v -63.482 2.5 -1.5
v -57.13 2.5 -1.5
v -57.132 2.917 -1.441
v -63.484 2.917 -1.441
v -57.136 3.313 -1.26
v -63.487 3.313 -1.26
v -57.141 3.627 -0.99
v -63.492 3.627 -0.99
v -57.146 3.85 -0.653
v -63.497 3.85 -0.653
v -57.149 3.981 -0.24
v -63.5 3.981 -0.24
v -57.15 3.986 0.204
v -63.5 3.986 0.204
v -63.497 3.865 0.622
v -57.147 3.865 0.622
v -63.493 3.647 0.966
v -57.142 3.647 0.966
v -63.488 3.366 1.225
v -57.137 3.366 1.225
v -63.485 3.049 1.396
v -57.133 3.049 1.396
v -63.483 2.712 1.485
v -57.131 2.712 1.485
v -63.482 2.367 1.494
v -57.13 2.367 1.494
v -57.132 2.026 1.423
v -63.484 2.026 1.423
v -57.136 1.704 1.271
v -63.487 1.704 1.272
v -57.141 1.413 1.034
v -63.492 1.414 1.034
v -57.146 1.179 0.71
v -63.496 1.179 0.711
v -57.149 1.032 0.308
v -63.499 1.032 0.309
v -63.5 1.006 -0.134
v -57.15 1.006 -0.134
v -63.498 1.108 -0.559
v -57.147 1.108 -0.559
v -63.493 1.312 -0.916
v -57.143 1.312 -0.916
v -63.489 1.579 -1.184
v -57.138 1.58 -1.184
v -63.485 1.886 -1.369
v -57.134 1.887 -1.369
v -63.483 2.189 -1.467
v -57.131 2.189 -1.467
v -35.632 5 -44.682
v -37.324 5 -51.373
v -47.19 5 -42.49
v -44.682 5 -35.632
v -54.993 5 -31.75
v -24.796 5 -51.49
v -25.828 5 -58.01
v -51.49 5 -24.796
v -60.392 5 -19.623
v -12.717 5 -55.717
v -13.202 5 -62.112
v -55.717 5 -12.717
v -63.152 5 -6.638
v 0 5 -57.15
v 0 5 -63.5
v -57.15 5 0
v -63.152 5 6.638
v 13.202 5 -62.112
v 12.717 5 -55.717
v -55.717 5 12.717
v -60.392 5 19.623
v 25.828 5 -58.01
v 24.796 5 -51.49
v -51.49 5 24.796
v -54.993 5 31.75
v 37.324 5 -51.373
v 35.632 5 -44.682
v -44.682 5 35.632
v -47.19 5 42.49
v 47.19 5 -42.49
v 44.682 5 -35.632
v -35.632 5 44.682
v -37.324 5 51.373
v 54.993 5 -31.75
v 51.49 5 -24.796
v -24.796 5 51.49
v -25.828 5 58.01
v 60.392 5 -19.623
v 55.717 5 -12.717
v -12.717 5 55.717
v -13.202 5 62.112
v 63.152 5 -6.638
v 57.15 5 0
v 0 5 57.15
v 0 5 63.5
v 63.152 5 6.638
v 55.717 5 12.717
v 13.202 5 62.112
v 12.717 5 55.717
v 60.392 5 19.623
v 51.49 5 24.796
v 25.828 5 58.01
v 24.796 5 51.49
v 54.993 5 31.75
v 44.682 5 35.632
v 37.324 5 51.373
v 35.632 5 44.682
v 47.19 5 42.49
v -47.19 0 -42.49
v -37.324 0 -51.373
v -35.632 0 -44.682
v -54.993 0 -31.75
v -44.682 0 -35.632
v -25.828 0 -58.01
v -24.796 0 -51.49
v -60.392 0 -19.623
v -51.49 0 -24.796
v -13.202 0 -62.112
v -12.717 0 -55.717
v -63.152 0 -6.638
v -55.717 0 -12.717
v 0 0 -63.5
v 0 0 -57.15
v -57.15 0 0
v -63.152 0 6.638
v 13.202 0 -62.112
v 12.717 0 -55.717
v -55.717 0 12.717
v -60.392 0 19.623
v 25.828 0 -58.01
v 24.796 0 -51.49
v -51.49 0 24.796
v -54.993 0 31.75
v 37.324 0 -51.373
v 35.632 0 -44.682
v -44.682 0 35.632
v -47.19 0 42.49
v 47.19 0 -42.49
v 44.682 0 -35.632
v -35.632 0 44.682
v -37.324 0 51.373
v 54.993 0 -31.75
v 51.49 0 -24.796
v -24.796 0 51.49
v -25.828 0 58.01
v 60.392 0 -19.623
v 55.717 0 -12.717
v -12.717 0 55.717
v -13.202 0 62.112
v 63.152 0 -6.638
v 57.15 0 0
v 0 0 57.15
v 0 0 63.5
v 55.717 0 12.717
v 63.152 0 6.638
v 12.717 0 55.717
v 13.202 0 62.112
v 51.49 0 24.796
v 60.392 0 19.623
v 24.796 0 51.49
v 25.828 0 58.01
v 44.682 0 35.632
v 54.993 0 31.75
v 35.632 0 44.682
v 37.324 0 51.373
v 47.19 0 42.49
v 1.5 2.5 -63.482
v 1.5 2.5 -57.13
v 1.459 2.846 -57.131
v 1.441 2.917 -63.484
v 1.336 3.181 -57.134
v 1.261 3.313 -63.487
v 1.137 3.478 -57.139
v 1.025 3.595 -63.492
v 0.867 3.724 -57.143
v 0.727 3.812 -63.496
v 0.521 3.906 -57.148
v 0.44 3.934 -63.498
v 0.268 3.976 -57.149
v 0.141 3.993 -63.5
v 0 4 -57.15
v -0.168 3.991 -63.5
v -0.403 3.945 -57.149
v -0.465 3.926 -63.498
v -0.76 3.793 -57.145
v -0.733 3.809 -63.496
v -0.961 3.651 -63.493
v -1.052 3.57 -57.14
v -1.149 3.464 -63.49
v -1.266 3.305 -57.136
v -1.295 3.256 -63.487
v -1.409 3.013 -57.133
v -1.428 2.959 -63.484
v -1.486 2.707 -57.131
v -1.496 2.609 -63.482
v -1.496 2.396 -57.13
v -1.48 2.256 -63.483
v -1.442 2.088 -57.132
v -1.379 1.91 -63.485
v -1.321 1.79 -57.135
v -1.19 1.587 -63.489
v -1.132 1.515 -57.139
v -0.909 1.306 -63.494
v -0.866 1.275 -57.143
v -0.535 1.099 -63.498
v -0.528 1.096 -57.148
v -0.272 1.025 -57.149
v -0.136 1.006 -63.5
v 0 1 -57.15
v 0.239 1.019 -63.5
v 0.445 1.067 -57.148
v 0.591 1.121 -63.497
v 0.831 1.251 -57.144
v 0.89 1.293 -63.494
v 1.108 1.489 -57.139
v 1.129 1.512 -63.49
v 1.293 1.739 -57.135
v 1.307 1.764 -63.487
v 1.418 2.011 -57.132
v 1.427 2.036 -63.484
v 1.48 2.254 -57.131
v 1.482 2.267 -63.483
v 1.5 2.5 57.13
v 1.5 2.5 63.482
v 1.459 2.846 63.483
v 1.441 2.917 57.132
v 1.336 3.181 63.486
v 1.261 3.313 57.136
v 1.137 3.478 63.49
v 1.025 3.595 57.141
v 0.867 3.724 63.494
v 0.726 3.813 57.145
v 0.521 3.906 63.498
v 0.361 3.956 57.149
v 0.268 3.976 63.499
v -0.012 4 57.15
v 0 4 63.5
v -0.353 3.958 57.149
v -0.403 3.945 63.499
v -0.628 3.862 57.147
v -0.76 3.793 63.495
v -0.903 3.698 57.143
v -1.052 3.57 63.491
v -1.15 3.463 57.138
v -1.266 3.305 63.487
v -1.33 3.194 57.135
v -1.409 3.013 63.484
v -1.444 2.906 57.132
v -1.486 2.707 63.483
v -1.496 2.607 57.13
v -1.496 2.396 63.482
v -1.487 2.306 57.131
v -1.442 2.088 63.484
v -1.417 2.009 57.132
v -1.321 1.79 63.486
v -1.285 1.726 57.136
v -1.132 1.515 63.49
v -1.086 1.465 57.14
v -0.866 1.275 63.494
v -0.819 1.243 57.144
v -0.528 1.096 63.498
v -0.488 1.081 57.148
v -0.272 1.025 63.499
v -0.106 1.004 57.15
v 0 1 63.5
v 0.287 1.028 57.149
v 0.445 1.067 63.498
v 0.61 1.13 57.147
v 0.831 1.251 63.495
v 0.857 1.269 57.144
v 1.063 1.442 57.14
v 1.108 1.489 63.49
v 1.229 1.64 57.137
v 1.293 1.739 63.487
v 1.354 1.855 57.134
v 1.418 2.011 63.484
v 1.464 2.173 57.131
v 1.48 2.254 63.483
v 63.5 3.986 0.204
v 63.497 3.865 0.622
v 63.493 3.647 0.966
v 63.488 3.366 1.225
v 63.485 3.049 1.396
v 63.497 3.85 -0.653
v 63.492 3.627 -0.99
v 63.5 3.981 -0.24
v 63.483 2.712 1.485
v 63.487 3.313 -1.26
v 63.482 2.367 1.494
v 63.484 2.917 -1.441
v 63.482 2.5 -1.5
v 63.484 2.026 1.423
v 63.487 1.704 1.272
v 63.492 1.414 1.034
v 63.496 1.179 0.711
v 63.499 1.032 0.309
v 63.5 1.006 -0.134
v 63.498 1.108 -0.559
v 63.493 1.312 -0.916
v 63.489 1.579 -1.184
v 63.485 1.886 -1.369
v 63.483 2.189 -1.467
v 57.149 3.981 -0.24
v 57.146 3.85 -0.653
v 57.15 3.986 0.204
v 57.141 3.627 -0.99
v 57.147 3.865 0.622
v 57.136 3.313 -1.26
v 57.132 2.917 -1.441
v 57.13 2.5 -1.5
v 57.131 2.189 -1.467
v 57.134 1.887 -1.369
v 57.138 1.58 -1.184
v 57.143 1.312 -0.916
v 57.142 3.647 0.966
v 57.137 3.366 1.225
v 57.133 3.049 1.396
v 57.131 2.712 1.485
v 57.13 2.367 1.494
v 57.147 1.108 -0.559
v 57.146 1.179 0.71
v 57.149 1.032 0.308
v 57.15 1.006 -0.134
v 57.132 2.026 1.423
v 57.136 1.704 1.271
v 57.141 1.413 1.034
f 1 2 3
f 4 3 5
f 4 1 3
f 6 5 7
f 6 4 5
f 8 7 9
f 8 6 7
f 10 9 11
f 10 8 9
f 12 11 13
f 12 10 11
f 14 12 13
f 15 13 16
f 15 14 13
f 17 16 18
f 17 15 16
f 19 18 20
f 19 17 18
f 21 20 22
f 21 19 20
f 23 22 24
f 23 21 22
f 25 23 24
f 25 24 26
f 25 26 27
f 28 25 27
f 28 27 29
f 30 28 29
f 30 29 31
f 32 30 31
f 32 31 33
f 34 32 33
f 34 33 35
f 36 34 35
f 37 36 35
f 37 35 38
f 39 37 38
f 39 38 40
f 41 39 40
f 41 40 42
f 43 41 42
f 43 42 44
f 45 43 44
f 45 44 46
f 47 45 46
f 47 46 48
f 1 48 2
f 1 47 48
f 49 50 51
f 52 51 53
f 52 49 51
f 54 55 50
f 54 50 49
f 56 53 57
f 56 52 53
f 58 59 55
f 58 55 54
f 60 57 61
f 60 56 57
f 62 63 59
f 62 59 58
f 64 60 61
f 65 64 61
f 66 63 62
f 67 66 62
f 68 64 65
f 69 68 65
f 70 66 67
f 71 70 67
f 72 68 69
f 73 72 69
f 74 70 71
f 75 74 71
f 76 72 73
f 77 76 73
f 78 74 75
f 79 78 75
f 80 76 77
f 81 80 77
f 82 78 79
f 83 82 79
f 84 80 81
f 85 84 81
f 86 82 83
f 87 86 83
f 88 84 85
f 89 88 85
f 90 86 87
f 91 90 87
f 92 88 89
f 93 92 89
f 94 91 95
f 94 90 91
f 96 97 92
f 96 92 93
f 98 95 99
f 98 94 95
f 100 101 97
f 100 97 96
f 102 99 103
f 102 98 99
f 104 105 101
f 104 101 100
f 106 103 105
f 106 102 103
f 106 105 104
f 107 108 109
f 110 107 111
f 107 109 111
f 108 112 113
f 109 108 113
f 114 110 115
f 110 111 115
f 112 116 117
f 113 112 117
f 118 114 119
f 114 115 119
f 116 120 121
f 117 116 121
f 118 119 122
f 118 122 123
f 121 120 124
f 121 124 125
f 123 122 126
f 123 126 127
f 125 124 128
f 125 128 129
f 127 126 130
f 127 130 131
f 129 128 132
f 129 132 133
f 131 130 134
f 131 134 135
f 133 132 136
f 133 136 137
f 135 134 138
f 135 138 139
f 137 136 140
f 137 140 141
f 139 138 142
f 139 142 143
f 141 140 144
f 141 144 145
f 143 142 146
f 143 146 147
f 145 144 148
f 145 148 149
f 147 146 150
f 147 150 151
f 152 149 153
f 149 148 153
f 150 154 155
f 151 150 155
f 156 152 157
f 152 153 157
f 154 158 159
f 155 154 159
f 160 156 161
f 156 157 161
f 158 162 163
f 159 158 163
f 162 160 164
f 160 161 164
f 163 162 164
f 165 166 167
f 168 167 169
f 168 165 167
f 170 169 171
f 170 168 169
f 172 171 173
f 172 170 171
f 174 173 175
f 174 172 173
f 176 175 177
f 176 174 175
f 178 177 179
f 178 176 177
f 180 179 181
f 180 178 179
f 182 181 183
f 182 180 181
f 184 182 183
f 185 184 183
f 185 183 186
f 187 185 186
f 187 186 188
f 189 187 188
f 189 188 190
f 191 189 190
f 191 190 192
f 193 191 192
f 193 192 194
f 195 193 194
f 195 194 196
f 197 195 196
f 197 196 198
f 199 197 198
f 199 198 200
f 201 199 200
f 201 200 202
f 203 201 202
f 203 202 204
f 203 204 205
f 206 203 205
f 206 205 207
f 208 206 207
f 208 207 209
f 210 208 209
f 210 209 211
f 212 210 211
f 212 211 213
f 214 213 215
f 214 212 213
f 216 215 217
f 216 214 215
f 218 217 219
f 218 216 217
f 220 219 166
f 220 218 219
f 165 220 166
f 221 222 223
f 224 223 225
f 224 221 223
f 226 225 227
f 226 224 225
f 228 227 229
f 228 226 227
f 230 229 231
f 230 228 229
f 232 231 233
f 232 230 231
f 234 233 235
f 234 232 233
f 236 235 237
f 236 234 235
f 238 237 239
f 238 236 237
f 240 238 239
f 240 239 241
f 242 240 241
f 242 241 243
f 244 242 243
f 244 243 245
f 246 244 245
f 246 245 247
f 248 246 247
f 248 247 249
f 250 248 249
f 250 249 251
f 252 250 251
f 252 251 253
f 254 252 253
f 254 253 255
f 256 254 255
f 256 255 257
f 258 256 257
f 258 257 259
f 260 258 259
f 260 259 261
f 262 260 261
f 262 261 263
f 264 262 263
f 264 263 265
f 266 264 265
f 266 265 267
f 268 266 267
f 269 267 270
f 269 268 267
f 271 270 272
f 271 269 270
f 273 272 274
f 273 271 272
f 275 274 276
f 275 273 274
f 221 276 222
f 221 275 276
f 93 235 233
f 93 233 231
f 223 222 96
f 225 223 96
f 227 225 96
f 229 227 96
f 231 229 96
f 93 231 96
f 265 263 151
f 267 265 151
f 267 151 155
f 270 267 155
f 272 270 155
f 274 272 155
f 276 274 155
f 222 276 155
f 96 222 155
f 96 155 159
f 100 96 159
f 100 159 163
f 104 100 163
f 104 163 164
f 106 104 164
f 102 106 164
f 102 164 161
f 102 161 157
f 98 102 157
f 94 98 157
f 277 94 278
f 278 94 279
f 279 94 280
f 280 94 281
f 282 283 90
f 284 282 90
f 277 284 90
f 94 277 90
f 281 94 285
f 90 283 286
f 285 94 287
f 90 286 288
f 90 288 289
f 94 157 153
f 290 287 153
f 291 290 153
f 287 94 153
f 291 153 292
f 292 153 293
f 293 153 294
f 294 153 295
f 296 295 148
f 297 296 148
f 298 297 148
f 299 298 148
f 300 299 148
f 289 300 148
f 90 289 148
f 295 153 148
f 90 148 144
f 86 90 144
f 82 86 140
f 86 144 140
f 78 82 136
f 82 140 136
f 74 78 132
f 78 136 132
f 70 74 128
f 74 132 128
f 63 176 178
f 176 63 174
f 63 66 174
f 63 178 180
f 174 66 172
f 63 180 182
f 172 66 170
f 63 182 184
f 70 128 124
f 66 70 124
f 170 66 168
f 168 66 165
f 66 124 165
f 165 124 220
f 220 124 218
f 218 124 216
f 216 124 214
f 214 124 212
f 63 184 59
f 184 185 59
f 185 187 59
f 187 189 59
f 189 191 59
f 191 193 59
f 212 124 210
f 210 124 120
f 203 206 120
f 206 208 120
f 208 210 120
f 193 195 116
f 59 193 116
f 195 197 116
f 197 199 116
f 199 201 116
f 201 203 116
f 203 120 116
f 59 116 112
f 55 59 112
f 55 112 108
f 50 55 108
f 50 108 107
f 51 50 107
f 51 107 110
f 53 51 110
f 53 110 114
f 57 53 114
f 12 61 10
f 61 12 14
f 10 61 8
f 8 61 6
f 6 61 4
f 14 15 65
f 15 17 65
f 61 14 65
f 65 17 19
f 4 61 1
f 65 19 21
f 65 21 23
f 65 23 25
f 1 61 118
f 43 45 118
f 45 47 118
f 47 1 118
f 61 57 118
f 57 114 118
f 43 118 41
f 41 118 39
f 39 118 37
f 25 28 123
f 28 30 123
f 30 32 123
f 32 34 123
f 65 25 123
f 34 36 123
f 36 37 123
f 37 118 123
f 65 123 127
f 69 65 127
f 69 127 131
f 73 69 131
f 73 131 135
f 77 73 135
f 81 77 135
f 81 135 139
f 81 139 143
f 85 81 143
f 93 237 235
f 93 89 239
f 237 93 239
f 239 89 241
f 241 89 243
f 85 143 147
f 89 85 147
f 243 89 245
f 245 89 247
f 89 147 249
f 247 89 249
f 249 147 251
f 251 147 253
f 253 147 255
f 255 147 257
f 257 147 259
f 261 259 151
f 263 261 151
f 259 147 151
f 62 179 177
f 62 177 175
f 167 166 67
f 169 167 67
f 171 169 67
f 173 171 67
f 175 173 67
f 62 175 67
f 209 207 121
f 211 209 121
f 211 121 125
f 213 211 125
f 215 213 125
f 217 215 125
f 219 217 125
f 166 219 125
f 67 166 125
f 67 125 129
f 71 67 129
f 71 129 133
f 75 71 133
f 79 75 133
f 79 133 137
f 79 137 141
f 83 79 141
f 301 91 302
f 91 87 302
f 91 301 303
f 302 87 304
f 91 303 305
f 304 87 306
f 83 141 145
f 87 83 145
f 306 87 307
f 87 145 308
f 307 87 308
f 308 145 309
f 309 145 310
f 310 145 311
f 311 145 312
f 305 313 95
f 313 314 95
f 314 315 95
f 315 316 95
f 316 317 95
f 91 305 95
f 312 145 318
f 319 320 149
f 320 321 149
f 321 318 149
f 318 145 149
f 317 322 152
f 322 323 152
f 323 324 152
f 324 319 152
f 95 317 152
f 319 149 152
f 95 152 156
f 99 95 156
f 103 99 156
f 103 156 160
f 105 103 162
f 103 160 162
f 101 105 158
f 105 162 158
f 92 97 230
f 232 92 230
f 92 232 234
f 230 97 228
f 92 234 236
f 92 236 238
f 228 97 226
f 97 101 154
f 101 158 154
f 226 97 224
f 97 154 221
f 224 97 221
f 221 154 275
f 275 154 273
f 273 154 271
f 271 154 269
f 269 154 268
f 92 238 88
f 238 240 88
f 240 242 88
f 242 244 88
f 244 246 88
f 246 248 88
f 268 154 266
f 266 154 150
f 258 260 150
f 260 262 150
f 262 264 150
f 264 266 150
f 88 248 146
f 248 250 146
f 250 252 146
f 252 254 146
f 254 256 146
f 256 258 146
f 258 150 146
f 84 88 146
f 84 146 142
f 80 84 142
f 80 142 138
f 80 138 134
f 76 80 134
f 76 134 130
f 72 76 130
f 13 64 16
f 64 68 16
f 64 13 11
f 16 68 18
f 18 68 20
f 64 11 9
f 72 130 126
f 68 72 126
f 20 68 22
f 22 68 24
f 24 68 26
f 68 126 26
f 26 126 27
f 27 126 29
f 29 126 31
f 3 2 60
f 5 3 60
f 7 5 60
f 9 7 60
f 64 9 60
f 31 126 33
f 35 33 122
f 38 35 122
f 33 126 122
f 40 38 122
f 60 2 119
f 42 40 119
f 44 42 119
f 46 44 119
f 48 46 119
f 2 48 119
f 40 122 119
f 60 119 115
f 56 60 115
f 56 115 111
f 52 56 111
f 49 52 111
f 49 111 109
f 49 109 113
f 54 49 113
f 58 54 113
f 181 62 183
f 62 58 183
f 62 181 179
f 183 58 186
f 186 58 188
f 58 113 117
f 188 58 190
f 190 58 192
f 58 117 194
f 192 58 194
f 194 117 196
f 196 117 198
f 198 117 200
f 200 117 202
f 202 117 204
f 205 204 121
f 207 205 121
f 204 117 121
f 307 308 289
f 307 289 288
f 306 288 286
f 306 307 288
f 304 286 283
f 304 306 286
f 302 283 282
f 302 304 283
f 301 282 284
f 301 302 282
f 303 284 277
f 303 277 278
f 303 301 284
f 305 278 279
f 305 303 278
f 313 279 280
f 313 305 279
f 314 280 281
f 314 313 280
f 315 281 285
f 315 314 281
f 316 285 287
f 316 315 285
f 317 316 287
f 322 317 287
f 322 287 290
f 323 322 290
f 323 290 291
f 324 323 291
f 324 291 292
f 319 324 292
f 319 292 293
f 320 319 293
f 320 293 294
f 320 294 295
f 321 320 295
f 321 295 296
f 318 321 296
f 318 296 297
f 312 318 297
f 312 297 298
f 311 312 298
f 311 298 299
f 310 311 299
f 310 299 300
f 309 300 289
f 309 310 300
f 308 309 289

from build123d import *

# Parameters (mm, degrees)
OUTER_RING_MAIN_SKETCH_R   = 63.5
OUTER_RING_MAIN_BODY_DEPTH = 5
CENTER_HOLE_SKETCH_R       = 57.15
CENTER_HOLE_DEPTH          = 90.94164775
PIN_HOLE_DEPTH             = 90.94164775
PIN_HOLE_DEPTH_BACK        = 90.94164775
PIN_HOLE_SKETCH_R          = 1.5
PIN_HOLE_2_DEPTH           = 90.941647898
PIN_HOLE_2_DEPTH_BACK      = 90.941647898
PIN_HOLE_2_SKETCH_R        = 1.5


with BuildPart() as part:
    # Outer Ring Main Sketch → Outer Ring Main Body (new body)
    with BuildSketch(Plane(origin=(0, 0, 0), x_dir=(1, 0, 0), z_dir=(0, 1, 0))):
        with Locations(Location((0, 0, 0), (0, 0, 270))):
            Circle(OUTER_RING_MAIN_SKETCH_R)
    extrude(amount=OUTER_RING_MAIN_BODY_DEPTH)

    # Center Hole Sketch → Center Hole (cut, through all)
    with BuildSketch(Plane.XZ):
        with Locations(Location((0, 0, 0), (0, 0, 270))):
            Circle(CENTER_HOLE_SKETCH_R)
    extrude(amount=-CENTER_HOLE_DEPTH, mode=Mode.SUBTRACT)

    # Pin Hole Sketch → Pin Hole (cut, two sides: drawn at the far end of the back side and taken through both)
    with BuildSketch(Plane.XY.offset(-PIN_HOLE_DEPTH_BACK)):
        with Locations((0, 2.5)):
            Circle(PIN_HOLE_SKETCH_R)
    extrude(amount=PIN_HOLE_DEPTH + PIN_HOLE_DEPTH_BACK, mode=Mode.SUBTRACT)

    # Pin Hole 2 Sketch → Pin Hole 2 (cut, two sides: drawn at the far end of the back side and taken through both)
    with BuildSketch(Plane(origin=(0, 0, 0), x_dir=(0, 0, -1), z_dir=(1, 0, 0)).offset(-PIN_HOLE_2_DEPTH_BACK)):
        with Locations((0, 2.5)):
            Circle(PIN_HOLE_2_SKETCH_R)
    extrude(amount=PIN_HOLE_2_DEPTH + PIN_HOLE_2_DEPTH_BACK, mode=Mode.SUBTRACT)


solid = part.part
